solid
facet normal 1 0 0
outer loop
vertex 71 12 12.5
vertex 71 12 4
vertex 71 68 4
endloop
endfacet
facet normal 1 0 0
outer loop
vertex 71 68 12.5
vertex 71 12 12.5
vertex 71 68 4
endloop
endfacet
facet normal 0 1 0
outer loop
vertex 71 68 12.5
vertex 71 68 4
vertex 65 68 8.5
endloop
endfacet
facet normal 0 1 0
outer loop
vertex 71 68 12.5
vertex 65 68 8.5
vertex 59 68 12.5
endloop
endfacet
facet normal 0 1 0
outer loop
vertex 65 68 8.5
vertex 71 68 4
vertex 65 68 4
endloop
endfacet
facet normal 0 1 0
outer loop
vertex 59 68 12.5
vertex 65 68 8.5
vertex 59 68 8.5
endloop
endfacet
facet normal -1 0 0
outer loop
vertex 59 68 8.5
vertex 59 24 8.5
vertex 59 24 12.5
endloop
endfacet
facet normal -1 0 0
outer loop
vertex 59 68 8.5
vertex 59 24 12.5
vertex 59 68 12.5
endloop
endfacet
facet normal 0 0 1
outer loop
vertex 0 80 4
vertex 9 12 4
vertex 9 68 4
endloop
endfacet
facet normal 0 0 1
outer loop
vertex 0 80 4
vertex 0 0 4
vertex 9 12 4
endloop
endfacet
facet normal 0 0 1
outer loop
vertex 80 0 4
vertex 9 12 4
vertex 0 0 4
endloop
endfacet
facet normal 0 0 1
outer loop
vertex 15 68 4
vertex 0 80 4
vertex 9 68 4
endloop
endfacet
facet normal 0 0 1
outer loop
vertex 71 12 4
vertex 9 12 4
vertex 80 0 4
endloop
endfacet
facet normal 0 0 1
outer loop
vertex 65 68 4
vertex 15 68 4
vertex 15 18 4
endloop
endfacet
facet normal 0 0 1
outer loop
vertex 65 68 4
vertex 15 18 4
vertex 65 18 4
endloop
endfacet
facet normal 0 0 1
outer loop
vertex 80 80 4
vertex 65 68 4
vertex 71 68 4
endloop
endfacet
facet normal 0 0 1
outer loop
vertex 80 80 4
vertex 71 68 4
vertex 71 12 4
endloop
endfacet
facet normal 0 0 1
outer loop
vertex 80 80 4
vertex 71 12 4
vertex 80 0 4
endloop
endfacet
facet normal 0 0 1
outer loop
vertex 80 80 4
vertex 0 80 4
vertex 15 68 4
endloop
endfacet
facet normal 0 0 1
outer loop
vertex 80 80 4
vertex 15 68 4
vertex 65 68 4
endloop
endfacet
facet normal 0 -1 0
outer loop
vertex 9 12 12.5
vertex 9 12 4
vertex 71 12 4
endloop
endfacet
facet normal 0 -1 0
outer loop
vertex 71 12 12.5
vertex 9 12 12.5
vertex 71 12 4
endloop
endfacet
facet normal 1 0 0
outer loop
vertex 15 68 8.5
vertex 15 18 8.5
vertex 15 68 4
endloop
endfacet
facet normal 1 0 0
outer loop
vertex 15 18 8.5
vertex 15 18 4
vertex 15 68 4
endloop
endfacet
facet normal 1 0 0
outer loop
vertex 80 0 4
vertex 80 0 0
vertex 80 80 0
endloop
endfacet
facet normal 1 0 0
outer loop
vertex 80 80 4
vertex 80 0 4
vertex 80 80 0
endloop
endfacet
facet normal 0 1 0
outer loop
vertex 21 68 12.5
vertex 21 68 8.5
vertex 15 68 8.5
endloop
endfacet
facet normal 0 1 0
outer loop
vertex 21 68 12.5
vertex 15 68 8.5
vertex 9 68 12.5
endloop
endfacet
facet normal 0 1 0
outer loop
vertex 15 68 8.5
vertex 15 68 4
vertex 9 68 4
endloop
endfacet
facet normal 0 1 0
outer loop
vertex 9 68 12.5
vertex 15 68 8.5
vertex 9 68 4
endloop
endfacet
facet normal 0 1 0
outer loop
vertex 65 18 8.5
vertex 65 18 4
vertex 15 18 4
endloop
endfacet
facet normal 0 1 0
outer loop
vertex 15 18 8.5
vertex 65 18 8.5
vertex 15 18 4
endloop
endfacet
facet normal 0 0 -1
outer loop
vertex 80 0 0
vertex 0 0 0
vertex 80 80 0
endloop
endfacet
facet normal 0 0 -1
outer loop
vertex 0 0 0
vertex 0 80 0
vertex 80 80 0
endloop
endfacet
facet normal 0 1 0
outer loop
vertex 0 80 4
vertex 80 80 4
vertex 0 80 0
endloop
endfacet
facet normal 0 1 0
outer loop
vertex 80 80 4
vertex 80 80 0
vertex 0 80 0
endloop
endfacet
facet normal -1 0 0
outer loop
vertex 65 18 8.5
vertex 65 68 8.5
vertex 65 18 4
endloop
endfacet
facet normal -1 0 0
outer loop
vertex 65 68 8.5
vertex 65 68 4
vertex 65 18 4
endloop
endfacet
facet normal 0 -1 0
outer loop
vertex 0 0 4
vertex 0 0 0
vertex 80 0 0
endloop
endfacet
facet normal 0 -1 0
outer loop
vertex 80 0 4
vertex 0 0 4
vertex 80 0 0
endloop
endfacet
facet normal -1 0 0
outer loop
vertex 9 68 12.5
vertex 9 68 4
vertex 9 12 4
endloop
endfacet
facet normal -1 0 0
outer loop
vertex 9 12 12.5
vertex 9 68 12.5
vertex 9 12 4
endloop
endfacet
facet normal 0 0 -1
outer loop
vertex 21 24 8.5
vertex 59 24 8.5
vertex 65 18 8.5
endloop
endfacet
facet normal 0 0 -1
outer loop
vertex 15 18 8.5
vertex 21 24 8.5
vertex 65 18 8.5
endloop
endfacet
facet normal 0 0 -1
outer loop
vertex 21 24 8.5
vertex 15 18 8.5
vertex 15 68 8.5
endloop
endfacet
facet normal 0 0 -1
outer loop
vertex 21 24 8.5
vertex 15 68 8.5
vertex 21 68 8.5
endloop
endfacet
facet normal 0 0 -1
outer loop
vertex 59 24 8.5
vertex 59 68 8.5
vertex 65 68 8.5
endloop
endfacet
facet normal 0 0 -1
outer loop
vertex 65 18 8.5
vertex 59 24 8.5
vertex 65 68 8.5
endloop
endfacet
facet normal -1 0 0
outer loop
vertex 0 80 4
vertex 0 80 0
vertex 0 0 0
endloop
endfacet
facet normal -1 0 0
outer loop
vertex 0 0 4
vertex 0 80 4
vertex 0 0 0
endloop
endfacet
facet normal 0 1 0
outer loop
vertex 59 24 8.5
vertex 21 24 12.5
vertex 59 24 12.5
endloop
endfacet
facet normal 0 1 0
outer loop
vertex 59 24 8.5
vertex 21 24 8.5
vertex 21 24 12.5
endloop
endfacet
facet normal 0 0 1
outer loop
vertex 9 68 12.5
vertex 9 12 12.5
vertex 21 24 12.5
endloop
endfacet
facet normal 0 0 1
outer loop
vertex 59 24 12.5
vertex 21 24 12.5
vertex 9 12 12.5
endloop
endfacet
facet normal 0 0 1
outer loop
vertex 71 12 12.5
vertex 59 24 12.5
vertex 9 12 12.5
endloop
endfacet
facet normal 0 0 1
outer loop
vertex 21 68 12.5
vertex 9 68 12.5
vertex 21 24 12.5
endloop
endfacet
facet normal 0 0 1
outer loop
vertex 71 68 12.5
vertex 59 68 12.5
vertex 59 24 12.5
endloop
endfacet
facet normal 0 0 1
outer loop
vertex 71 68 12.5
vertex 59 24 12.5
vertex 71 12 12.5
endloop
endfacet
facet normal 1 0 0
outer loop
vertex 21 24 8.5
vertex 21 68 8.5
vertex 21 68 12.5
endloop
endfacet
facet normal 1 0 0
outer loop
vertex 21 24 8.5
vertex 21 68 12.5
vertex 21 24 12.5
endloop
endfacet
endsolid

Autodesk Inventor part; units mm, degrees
ref_plane "YZ Plane" through (0, 0, 0) normal (1, 0, 0) x (0, 1, 0)
ref_plane "XZ Plane" through (0, 0, 0) normal (0, 1, 0) x (-1, 0, 0)
ref_plane "XY Plane" through (0, 0, 0) normal (0, 0, 1) x (1, 0, 0)
sketch "Sketch1" plane through (0, 0, 0) normal (0, 0, 1) x (1, 0, 0)
  line L0 (0, 0) -> (80, 0)
  line L1 (80, 0) -> (80, 80)
  line L2 (80, 80) -> (0, 80)
  line L3 (0, 80) -> (0, 0)
  dimension "d0" = 80
  dimension "d1" = 80
extrude "Extrusion1" add sketch "Sketch1" along normal blind 4
sketch "Sketch2" plane through (0, 0, 4) normal (0, 0, 1) x (1, 0, 0)
  line L0 (0, 0) -> (80, 0) projected
  line L1 (80, 0) -> (80, 80) projected
  line L2 (9, 68) -> (9, 12)
  line L3 (9, 12) -> (71, 12)
  line L4 (71, 12) -> (71, 68)
  line L5 (71, 68) -> (65, 68)
  line L6 (65, 68) -> (65, 18)
  line L7 (65, 18) -> (15, 18)
  line L8 (15, 18) -> (15, 68)
  line L9 (15, 68) -> (9, 68)
  dimension "d4" = 6
  dimension "d5" = 6
  dimension "d6" = 50
  dimension "d7" = 50
  dimension "d8" = 9
  dimension "d9" = 12
extrude "Extrusion2" add sketch "Sketch2" along normal blind 4.5
sketch "Sketch3" plane through (0, 0, 8.5) normal (0, 0, 1) x (1, 0, 0)
  line L0 (9, 68) -> (9, 12) projected
  line L1 (9, 12) -> (71, 12) projected
  line L2 (71, 12) -> (71, 68) projected
  line L3 (71, 68) -> (65, 68) projected
  line L4 (65, 68) -> (65, 18) projected
  line L5 (65, 18) -> (15, 18) projected
  line L6 (15, 18) -> (15, 68) projected
  line L7 (15, 68) -> (9, 68) projected
  line L8 (15, 68) -> (21, 68)
  line L9 (21, 68) -> (21, 24)
  line L10 (21, 24) -> (59, 24)
  line L11 (59, 24) -> (59, 68)
  line L12 (59, 68) -> (65, 68)
  point P0 (0, 0)
  dimension "d12" = 6
  dimension "d13" = 6
extrude "Extrusion3" add sketch "Sketch3" along normal blind 4
properties part number "SpoolHolderSplitBase"
